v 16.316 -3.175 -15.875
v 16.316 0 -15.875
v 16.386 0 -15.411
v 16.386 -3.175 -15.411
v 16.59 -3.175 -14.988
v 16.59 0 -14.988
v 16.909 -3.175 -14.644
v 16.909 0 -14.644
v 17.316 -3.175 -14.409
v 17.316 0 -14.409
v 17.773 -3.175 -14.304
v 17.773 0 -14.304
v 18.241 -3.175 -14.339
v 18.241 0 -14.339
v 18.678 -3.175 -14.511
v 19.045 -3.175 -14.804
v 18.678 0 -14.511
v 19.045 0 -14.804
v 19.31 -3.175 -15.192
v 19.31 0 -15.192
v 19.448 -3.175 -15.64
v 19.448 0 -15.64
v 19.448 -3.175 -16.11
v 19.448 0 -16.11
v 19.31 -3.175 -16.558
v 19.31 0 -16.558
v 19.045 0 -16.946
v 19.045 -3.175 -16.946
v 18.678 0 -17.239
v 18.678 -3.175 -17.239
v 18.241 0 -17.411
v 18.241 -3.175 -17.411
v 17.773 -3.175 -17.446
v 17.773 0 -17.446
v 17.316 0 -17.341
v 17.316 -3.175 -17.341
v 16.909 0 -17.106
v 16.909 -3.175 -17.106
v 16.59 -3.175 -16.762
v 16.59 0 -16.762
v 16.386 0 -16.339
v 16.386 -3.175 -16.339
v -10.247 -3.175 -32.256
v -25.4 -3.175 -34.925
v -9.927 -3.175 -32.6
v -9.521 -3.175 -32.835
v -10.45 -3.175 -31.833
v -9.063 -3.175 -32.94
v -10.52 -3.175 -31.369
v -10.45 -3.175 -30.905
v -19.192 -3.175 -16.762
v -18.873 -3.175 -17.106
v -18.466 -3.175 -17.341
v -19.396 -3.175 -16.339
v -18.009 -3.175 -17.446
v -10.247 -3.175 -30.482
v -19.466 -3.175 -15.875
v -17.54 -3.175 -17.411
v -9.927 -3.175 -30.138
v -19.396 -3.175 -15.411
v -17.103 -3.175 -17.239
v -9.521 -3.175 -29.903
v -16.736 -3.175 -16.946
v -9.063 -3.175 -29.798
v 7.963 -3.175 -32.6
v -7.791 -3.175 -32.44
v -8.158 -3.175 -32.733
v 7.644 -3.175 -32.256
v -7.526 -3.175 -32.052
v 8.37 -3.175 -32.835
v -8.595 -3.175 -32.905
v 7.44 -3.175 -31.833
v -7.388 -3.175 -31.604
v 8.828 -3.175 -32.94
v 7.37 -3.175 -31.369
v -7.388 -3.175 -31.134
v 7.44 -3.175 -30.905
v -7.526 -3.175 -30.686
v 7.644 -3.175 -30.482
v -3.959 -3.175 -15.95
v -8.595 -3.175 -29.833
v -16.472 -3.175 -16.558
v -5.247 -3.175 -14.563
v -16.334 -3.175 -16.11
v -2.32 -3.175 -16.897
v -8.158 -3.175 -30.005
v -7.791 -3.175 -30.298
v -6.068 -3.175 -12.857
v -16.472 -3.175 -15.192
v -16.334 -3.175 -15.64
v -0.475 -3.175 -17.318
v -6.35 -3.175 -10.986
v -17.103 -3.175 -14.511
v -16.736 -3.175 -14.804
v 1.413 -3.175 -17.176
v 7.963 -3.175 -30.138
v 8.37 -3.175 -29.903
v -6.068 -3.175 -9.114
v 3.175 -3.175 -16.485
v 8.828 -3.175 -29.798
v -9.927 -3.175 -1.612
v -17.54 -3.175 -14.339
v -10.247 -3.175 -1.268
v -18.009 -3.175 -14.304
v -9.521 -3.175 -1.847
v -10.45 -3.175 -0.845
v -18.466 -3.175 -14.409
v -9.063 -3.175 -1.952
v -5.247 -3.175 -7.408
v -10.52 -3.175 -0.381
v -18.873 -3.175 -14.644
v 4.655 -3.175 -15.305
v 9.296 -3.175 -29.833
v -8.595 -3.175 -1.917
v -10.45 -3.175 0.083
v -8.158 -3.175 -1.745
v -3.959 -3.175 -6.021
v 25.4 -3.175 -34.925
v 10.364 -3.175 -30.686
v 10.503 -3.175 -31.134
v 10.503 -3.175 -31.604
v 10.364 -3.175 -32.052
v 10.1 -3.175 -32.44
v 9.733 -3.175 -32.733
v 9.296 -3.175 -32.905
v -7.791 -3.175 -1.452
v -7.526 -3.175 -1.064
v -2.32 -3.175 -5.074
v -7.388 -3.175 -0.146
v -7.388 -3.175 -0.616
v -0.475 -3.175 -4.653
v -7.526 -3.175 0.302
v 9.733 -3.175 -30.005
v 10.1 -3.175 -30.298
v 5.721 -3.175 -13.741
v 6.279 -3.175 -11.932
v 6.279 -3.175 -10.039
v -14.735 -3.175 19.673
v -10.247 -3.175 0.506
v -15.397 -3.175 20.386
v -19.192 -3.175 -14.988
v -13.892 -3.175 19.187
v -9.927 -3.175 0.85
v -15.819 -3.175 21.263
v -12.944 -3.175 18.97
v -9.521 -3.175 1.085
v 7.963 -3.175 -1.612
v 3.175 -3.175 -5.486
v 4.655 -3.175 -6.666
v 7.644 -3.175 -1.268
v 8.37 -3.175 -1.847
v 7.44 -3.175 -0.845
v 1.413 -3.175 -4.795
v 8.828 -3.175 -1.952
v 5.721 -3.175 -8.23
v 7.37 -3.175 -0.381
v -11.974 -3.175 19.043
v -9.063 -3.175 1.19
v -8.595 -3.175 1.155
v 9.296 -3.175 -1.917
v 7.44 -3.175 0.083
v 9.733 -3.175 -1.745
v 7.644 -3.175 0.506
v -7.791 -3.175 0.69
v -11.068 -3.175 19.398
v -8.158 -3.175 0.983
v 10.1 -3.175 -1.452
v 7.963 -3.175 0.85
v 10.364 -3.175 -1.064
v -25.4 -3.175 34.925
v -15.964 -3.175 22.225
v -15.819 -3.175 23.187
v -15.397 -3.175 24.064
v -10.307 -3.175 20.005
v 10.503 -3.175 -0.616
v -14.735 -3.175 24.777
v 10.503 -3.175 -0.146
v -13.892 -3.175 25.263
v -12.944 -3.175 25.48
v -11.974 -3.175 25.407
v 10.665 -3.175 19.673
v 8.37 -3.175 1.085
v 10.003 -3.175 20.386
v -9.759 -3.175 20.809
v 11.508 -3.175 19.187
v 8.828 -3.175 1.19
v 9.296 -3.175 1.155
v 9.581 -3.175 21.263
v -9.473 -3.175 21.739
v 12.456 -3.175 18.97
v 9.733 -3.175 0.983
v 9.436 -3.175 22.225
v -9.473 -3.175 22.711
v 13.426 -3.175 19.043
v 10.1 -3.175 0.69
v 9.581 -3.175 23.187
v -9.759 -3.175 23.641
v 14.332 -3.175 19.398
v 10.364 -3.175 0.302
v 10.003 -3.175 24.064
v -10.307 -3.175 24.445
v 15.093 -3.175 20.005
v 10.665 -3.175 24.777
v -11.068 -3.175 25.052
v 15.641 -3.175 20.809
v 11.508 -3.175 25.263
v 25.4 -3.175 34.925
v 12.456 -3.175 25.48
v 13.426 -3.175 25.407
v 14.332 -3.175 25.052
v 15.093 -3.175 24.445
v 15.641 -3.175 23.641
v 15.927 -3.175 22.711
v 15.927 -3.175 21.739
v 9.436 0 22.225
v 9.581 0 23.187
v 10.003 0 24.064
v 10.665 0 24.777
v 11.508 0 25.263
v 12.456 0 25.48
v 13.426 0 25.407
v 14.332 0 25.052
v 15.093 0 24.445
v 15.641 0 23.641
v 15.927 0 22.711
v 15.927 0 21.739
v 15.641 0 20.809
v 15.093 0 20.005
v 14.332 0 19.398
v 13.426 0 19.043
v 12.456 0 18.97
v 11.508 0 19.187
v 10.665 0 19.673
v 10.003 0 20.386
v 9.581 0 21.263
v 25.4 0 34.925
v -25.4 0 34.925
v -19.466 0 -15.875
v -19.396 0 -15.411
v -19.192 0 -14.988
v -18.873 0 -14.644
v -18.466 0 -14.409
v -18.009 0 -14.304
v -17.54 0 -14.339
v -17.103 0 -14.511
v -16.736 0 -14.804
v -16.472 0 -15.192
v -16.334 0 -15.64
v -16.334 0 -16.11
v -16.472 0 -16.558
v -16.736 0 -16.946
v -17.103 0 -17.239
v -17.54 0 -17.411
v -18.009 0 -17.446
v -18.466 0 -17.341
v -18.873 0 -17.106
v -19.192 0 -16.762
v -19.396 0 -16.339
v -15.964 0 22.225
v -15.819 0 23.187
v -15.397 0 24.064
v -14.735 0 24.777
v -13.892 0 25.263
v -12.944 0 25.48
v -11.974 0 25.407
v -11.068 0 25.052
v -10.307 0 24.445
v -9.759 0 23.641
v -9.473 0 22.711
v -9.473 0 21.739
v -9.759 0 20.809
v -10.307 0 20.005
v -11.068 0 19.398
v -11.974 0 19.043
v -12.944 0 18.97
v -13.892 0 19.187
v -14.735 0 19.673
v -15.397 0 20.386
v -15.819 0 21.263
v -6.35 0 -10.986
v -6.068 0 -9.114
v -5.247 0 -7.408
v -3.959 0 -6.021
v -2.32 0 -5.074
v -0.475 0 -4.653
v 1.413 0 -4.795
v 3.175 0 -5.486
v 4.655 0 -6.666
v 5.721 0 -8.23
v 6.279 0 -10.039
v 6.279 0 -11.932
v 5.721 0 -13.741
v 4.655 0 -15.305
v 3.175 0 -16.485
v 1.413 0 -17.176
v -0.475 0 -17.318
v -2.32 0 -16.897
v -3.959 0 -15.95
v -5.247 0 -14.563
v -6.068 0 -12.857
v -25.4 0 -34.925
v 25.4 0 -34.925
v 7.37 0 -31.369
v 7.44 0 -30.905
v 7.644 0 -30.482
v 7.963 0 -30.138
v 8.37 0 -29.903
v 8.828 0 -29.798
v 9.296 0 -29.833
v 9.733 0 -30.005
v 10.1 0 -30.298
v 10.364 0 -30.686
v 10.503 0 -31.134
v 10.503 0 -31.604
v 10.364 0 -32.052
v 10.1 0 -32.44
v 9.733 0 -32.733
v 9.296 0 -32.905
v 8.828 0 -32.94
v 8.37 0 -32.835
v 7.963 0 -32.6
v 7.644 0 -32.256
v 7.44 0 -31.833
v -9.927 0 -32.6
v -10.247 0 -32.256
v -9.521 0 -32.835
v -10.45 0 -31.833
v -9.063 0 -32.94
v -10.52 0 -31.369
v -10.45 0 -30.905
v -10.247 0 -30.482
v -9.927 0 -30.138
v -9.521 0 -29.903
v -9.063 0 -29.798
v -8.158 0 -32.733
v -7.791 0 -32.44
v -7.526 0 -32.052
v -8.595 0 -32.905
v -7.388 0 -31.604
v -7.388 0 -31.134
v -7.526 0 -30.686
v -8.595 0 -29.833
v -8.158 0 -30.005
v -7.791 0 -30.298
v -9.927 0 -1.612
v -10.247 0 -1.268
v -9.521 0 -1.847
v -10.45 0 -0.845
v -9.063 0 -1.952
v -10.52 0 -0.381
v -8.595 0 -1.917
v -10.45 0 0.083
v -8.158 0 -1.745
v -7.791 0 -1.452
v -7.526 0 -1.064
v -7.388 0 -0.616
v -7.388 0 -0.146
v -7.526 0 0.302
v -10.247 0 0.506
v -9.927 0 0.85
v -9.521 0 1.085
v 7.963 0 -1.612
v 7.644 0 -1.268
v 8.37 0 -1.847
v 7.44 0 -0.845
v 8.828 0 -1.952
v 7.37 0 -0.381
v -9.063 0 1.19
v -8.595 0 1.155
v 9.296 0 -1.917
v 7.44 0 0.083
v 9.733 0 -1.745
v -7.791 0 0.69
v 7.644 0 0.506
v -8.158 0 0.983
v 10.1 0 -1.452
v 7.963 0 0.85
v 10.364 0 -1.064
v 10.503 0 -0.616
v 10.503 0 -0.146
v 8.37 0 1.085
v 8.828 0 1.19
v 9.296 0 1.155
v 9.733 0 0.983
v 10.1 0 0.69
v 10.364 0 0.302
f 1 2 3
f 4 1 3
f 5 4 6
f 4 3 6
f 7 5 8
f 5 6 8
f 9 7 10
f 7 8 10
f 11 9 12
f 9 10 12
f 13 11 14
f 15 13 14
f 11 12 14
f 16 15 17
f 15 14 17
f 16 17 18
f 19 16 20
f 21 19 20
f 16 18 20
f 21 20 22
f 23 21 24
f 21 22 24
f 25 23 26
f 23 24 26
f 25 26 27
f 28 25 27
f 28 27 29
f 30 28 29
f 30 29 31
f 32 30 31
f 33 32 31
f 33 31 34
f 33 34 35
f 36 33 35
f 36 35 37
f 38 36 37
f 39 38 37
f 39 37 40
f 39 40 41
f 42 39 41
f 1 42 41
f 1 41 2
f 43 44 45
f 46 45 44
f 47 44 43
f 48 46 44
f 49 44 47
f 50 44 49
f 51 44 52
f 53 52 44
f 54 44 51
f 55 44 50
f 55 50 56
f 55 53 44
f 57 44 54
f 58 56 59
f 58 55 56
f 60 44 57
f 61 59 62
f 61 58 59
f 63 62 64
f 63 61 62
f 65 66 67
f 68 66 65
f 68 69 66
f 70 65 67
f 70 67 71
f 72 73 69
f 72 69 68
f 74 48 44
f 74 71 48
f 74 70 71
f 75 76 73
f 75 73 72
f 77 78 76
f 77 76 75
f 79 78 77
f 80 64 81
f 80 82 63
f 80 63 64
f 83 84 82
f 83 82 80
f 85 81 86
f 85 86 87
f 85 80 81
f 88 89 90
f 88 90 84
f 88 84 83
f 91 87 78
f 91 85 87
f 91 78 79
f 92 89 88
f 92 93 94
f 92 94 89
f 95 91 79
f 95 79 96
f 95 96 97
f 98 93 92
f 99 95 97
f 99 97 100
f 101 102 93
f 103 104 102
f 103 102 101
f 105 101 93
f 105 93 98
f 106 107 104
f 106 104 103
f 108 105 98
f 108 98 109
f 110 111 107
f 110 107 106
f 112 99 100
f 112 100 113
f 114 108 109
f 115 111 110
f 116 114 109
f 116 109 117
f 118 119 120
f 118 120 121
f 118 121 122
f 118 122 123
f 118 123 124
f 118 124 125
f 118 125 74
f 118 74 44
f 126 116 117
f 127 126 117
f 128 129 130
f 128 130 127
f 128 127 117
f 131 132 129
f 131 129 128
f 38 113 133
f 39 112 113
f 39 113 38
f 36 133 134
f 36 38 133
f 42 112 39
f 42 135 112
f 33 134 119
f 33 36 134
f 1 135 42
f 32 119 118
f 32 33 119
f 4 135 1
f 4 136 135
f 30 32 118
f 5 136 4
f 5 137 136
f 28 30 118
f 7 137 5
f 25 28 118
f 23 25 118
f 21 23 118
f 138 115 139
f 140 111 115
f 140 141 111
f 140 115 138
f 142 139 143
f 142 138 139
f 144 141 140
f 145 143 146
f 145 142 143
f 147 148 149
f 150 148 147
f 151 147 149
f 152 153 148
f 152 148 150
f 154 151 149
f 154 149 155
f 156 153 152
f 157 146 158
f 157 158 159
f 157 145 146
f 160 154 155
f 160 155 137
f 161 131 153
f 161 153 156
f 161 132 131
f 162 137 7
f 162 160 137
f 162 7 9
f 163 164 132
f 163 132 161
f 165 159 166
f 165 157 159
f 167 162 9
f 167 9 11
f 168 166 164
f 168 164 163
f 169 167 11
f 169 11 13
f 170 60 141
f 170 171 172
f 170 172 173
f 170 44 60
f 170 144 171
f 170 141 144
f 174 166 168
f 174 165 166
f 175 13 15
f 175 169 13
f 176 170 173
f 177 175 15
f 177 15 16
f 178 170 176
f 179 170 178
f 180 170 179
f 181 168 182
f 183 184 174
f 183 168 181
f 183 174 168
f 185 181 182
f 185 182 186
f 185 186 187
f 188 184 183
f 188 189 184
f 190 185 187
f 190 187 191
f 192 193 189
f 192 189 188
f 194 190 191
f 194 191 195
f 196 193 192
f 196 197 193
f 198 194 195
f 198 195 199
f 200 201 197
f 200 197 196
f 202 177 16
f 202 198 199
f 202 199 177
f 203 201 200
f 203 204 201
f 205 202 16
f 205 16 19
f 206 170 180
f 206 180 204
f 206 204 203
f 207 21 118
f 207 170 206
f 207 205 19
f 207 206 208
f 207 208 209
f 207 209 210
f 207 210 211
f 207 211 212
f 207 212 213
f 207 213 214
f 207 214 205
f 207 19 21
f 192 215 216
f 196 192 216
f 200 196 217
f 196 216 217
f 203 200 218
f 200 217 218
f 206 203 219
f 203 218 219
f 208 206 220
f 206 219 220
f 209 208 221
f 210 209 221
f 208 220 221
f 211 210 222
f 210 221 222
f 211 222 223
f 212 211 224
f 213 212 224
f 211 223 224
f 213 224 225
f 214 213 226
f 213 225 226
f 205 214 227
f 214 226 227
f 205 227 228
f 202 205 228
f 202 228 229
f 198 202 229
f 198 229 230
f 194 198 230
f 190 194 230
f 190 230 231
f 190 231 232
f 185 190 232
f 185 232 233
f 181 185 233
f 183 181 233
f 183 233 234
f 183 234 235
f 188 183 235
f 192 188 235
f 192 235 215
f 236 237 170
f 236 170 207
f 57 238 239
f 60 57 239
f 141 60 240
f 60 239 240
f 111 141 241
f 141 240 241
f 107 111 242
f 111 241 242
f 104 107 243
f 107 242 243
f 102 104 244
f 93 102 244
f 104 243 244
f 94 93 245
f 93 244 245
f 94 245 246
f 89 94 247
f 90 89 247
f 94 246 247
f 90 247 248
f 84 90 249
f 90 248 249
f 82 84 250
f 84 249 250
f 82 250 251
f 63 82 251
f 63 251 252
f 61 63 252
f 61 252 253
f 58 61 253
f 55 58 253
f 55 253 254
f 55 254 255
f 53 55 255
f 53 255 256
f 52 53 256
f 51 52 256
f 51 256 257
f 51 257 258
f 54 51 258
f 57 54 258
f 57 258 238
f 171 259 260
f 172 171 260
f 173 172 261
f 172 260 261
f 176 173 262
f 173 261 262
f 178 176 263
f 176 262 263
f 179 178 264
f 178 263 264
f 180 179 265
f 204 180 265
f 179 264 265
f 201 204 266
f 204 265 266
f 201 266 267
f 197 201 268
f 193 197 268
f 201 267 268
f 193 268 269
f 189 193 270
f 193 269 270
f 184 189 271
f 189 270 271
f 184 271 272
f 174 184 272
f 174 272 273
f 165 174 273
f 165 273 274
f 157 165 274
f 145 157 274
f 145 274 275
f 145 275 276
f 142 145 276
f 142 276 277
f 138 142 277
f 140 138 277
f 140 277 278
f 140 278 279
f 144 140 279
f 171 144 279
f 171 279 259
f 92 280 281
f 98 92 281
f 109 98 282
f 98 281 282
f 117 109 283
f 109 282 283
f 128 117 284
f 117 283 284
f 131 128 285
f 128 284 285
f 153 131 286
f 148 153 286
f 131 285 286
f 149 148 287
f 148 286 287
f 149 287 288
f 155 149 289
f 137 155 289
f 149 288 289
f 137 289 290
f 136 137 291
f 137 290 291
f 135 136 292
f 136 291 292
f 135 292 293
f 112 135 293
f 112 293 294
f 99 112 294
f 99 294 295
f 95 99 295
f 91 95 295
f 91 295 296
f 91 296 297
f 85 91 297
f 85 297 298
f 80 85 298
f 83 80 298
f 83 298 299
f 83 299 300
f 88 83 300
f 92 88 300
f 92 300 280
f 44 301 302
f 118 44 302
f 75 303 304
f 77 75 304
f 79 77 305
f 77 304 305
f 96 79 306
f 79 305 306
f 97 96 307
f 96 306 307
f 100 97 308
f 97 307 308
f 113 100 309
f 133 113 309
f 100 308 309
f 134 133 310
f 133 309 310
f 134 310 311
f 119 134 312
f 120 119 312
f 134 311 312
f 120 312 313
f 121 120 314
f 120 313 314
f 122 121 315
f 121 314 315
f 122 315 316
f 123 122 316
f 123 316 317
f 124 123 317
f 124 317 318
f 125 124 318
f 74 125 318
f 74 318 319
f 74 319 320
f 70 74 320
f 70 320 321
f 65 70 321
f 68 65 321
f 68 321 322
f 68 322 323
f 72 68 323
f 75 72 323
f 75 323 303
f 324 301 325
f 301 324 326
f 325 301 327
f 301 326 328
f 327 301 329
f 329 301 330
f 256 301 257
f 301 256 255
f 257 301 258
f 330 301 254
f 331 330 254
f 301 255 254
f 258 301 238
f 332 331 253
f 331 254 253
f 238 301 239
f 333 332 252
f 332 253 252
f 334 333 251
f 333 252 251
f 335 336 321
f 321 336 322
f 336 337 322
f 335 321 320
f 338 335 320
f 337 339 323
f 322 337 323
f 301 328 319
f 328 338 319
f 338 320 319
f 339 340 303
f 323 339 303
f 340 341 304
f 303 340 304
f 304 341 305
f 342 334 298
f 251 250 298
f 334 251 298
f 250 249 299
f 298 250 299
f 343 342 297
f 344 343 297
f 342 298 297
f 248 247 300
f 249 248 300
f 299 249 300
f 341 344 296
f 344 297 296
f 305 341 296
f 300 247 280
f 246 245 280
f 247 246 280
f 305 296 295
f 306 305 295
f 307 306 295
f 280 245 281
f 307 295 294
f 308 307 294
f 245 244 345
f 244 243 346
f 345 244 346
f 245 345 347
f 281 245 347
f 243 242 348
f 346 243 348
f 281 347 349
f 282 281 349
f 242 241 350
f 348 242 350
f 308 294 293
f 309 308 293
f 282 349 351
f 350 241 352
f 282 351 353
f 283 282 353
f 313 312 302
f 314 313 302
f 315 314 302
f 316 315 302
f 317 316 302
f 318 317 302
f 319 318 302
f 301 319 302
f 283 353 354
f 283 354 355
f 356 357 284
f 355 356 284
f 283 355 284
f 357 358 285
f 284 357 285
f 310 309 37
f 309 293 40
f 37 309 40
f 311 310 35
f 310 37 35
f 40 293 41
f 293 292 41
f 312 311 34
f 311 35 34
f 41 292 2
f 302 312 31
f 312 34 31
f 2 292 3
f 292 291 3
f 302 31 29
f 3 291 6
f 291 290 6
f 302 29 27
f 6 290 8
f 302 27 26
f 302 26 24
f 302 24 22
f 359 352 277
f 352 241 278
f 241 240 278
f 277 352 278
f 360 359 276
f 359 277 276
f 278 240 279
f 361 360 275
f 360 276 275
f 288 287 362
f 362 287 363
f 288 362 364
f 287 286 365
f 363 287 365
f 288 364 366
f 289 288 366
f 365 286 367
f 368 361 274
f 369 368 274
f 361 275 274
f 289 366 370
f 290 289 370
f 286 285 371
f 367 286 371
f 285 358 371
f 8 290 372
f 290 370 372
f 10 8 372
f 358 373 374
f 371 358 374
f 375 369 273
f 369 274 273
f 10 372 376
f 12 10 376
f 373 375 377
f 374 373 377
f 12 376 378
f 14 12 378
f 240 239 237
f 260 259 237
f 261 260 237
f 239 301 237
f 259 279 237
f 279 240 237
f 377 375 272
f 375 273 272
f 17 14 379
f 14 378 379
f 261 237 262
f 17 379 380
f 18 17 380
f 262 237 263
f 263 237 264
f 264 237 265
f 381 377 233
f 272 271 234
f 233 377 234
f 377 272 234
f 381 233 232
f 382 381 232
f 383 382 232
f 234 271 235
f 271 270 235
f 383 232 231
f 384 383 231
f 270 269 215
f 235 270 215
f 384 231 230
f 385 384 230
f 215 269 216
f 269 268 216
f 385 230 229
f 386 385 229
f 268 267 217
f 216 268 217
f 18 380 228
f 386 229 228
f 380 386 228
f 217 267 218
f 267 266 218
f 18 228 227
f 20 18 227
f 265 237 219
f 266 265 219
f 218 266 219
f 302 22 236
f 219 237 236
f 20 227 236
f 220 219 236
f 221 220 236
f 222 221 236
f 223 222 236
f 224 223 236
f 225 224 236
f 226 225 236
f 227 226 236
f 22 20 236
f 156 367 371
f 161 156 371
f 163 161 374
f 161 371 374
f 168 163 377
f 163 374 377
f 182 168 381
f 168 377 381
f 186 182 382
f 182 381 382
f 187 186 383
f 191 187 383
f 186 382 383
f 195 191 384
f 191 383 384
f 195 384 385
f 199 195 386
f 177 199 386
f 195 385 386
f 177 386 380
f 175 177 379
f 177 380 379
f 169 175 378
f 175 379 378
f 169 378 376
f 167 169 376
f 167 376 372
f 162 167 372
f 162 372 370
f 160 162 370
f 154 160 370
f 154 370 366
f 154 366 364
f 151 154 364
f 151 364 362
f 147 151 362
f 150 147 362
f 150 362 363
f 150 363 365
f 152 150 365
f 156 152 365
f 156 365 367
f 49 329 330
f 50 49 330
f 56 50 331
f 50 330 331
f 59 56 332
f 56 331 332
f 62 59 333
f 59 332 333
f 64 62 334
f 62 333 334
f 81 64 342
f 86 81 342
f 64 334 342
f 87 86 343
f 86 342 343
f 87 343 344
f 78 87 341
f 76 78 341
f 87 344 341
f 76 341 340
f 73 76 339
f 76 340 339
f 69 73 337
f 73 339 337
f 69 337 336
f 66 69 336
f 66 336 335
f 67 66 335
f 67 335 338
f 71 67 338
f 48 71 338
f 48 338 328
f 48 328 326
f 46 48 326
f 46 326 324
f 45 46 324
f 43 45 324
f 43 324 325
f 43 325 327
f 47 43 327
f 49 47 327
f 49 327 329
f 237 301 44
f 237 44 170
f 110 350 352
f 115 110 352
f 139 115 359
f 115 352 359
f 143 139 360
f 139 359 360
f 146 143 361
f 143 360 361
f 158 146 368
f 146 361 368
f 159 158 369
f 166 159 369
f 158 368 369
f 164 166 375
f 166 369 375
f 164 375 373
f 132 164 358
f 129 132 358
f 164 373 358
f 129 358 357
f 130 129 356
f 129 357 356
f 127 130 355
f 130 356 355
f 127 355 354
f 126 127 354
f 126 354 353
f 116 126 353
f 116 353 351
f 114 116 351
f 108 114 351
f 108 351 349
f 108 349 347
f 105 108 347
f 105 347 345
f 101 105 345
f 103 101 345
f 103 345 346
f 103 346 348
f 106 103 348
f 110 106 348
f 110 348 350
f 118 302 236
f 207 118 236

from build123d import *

# Parameters (mm, degrees)
F0_W     = 50.8
F0_H     = 69.85
F1_DEPTH = 3.175
F3_D     = 6.5278
F5_D     = 3.15
F7_D     = 12.7


with BuildPart() as f1:
    # F0 (on Front) → F1 (new body)
    with BuildSketch(Plane.XZ):
        Rectangle(F0_W, F0_H)
    extrude(amount=F1_DEPTH)

    # F3 (through all)
    with Locations(Plane.XZ.offset(3.175)):
        with Locations((-12.7, 22.225), (12.7, 22.225)):
            Hole(F3_D / 2)

    # F5 (through all)
    with Locations(Plane.XZ.offset(3.175)):
        with Locations((-8.9454650708, -0.381), (8.9454650708, -0.381), (17.8909301416, -15.875), (8.9454650708, -31.369), (-8.9454650708, -31.369), (-17.8909301416, -15.875)):
            Hole(F5_D / 2)

    # F7 (through all)
    with Locations(Plane.XZ.offset(3.175)):
        with Locations((0, -10.9855)):
            Hole(F7_D / 2)


solid = f1.part
